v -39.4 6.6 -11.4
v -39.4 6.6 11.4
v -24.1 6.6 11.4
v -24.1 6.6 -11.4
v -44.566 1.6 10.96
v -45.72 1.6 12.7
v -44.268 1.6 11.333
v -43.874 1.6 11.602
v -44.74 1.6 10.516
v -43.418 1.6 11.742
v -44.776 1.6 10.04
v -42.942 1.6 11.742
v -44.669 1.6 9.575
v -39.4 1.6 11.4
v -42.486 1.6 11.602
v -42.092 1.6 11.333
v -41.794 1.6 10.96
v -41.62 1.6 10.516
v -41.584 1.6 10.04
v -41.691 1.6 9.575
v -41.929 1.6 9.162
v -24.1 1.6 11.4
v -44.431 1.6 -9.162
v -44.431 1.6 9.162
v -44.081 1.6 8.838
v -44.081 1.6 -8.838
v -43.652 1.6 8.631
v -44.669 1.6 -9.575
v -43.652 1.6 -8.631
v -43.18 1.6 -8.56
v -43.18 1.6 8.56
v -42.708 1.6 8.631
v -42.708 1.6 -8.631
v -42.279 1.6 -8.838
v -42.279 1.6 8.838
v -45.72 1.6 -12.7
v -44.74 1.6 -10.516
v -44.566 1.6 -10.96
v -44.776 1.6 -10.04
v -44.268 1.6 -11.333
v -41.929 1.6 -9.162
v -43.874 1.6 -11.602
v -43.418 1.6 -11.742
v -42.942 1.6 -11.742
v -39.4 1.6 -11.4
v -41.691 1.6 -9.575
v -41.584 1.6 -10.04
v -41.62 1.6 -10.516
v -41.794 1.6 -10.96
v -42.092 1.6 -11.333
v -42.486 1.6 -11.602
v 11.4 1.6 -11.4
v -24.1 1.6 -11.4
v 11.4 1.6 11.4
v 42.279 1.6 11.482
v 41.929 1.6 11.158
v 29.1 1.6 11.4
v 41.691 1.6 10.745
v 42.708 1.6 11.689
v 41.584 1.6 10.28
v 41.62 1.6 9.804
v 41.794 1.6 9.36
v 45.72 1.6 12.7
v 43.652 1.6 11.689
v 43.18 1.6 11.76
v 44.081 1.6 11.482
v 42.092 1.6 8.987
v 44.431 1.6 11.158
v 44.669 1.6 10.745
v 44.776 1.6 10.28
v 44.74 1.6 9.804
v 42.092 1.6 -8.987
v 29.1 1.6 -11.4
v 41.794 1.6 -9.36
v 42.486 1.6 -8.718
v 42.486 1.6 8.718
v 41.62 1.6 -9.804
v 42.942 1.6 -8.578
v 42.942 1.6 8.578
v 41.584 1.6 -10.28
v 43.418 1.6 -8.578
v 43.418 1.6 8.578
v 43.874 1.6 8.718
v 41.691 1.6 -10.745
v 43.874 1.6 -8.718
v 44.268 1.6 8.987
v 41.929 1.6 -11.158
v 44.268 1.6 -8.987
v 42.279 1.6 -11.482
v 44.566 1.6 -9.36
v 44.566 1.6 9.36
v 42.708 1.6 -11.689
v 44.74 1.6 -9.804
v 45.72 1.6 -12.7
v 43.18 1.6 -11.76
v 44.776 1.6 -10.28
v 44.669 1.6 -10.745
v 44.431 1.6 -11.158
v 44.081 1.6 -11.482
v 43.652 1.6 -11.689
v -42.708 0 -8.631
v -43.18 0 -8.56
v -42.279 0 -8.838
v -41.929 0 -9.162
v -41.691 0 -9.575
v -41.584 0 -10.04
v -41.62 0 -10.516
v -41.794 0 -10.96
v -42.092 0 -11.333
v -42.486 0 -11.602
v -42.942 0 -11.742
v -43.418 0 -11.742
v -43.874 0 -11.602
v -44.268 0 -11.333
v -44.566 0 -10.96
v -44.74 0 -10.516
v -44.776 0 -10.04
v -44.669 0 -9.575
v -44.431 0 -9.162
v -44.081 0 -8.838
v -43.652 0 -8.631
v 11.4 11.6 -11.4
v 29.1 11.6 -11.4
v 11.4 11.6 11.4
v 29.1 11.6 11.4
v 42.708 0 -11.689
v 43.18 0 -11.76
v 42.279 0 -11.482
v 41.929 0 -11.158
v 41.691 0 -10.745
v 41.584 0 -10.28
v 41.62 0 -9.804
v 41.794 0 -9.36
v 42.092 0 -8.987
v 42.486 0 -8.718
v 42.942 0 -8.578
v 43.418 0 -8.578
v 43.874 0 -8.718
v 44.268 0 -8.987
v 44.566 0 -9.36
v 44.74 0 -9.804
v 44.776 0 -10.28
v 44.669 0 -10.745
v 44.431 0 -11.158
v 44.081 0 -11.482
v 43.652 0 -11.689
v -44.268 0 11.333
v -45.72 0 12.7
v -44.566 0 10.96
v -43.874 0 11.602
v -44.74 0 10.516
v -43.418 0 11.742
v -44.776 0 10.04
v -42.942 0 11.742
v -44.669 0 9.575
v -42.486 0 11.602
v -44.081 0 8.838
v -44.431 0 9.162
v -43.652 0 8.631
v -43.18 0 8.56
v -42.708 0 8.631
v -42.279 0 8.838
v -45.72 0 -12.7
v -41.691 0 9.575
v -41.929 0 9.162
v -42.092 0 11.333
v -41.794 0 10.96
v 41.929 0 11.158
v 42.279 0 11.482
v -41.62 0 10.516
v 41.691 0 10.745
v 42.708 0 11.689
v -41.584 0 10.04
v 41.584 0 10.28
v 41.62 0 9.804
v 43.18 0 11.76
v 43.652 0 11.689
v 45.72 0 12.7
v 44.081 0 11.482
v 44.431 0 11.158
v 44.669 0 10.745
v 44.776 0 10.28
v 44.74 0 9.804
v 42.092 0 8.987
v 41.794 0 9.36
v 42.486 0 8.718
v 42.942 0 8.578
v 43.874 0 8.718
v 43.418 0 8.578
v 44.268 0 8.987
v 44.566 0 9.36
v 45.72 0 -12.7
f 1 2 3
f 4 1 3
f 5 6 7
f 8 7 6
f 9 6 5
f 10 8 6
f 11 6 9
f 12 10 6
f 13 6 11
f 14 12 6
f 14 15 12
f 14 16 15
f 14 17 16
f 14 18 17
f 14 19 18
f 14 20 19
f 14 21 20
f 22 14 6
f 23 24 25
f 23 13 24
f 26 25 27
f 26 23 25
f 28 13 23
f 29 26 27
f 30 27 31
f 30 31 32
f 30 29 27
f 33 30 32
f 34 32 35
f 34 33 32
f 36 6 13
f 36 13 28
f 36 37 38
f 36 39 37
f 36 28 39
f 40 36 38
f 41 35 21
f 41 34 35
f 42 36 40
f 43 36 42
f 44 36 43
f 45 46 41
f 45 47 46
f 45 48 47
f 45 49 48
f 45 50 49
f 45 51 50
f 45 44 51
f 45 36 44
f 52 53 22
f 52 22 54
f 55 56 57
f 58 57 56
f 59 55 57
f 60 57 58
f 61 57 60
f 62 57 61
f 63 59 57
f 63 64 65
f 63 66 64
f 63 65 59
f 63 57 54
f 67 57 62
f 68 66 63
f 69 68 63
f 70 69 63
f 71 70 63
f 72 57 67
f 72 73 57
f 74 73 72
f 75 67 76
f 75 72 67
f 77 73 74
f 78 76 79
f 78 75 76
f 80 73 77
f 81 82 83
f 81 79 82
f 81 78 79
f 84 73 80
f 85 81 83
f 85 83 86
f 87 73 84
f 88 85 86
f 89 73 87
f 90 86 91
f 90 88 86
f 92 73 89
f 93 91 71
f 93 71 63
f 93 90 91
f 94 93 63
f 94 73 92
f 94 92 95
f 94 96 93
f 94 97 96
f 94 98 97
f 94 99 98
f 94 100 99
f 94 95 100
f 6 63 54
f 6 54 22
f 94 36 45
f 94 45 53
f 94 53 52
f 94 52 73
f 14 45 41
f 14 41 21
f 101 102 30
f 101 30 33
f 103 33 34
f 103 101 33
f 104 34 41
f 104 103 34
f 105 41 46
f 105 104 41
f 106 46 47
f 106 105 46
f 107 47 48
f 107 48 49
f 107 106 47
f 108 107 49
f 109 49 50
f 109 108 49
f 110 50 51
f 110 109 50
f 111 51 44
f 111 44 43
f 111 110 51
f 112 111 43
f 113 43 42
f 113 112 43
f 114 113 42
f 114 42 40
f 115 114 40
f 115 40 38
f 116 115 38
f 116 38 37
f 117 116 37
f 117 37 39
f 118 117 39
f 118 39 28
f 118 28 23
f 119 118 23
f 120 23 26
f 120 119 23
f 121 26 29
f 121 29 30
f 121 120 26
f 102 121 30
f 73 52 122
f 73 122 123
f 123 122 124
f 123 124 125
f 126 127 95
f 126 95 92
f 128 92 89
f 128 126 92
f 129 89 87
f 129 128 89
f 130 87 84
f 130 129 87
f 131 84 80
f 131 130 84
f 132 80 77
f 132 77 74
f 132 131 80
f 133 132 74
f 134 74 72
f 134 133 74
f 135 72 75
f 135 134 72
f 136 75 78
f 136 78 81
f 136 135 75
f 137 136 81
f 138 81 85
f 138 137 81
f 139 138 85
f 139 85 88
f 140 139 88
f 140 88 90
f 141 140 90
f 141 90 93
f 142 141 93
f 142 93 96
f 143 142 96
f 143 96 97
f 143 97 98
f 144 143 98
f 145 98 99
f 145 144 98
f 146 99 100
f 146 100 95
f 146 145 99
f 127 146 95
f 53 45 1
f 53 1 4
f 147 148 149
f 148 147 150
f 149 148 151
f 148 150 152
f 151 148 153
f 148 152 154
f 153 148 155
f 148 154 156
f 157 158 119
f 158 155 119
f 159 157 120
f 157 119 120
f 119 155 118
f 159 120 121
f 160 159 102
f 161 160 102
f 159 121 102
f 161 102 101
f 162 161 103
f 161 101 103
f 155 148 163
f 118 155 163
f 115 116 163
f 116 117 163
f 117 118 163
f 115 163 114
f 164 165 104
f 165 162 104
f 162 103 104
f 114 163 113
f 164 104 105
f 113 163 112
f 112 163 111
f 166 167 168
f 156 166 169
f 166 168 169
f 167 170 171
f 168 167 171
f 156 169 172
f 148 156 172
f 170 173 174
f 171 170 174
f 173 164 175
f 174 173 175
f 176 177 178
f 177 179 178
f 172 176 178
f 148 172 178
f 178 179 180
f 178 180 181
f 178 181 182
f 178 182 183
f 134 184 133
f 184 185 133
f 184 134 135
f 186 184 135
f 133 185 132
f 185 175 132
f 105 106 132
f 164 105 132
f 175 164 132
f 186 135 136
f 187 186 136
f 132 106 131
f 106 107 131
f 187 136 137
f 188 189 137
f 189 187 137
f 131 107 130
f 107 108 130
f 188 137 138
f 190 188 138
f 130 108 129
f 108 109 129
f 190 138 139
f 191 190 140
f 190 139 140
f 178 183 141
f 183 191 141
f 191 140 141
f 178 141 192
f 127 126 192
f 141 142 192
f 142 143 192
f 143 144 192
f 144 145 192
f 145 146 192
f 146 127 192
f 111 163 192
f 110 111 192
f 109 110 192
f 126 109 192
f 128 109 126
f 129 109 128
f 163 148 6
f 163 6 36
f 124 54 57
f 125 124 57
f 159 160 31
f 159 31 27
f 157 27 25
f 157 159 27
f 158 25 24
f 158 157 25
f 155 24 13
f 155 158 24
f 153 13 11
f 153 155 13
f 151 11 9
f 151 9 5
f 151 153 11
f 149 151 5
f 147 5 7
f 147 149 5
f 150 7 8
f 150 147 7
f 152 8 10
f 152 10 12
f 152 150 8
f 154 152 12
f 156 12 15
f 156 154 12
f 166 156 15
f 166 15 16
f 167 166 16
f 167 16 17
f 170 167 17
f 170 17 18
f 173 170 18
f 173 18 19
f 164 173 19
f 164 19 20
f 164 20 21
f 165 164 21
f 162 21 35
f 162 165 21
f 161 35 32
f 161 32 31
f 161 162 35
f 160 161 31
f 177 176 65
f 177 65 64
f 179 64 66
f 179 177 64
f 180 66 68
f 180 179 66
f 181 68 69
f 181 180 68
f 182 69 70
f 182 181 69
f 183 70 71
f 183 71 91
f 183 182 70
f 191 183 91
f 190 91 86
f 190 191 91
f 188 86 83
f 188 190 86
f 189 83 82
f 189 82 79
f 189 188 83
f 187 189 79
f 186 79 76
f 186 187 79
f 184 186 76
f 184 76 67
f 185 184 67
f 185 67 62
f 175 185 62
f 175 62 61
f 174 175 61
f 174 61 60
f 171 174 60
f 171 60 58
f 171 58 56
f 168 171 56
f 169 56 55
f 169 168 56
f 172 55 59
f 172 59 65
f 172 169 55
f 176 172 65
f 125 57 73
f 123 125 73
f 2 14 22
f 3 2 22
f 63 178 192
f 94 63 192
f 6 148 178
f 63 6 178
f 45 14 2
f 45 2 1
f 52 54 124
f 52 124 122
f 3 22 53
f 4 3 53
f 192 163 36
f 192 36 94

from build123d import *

# Parameters (mm, degrees)
SKETCH_1_W      = 91.44
SKETCH_1_H      = 25.4
SKETCH_1_R      = 1.6
EXTRUDE_1_DEPTH = 1.6
SKETCH_2_W      = 15.3
SKETCH_2_H      = 22.8
EXTRUDE_2_DEPTH = 5
SKETCH_3_W      = 17.7
SKETCH_3_H      = 22.8
EXTRUDE_3_DEPTH = 10


with BuildPart() as part:
    # 草图1 → 凸台-拉伸1 (new body)
    with BuildSketch(Plane(origin=(0, 0, 0), x_dir=(1, 0, 0), z_dir=(0, 1, 0))):
        Rectangle(SKETCH_1_W, SKETCH_1_H)
        with Locations(Location((-43.18, 10.16, 0), (0, 0, 270))):
            Circle(SKETCH_1_R, mode=Mode.SUBTRACT)
        with Locations(Location((43.18, 10.16, 0), (0, 0, 90))):
            Circle(SKETCH_1_R, mode=Mode.SUBTRACT)
        with Locations(Location((43.18, -10.16, 0), (0, 0, 270))):
            Circle(SKETCH_1_R, mode=Mode.SUBTRACT)
        with Locations(Location((-43.18, -10.16, 0), (0, 0, 90))):
            Circle(SKETCH_1_R, mode=Mode.SUBTRACT)
    extrude(amount=EXTRUDE_1_DEPTH)

    # 草图2 → 凸台-拉伸2 (add)
    with BuildSketch(Plane(origin=(0, 1.6, 0), x_dir=(1, 0, 0), z_dir=(0, 1, 0))):
        with Locations((-31.75, 0)):
            Rectangle(SKETCH_2_W, SKETCH_2_H)
    extrude(amount=EXTRUDE_2_DEPTH)

    # 草图3 → 凸台-拉伸3 (add)
    with BuildSketch(Plane(origin=(0, 1.6, 0), x_dir=(1, 0, 0), z_dir=(0, 1, 0))):
        with Locations((20.25, 0)):
            Rectangle(SKETCH_3_W, SKETCH_3_H)
    extrude(amount=EXTRUDE_3_DEPTH)


solid = part.part
